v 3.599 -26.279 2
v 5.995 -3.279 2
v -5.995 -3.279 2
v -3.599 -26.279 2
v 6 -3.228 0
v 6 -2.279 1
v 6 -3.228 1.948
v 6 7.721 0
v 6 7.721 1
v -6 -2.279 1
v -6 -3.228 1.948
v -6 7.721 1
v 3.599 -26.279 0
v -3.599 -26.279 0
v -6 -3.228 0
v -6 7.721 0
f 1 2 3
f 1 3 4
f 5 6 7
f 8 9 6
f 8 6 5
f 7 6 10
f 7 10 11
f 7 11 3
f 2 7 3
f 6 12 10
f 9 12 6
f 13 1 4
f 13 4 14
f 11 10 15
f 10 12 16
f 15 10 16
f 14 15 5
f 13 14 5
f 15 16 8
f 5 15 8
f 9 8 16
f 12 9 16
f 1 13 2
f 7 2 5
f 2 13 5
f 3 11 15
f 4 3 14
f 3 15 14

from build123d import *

# Parameters (mm, degrees)
EXTRUDE_1_DEPTH     = 1
EXTRUDE_2_DEPTH     = 6
CUT_EXTRUDE_1_DEPTH = 27.97425922


with BuildPart() as part:
    # 草图1 → 凸台-拉伸1 (new body)
    with BuildSketch(Plane.XY):
        Polygon((6, -3.227529416), (6, 7.720527774), (-6, 7.720527774), (-6, -3.227529416), (-3.598755957, -26.279472226), (3.598755957, -26.279472226), align=None)
    extrude(amount=EXTRUDE_1_DEPTH)

    # 草图2 → 凸台-拉伸2 (add, symmetric)
    with BuildSketch(Plane(origin=(0, 0, 0), x_dir=(0, 0, -1), z_dir=(1, 0, 0))):
        Polygon((-2, -26.279472226), (-1, -26.279472226), (-1, -2.279472226), (-2, -3.279472226), align=None)
    extrude(amount=EXTRUDE_2_DEPTH, both=True)

    # 草图3 → 切除-拉伸1 (cut, through all)
    with BuildSketch(Plane(origin=(0, 0, 1), x_dir=(-1, 0, 0), z_dir=(0, 0, -1))):
        Polygon((6, -26.279472226), (6, -3.227529416), (3.598755957, -26.279472226), align=None)
        Polygon((-6, -26.279472226), (-3.598755957, -26.279472226), (-6, -3.227529416), align=None)
    extrude(amount=-CUT_EXTRUDE_1_DEPTH, mode=Mode.SUBTRACT)


solid = part.part
